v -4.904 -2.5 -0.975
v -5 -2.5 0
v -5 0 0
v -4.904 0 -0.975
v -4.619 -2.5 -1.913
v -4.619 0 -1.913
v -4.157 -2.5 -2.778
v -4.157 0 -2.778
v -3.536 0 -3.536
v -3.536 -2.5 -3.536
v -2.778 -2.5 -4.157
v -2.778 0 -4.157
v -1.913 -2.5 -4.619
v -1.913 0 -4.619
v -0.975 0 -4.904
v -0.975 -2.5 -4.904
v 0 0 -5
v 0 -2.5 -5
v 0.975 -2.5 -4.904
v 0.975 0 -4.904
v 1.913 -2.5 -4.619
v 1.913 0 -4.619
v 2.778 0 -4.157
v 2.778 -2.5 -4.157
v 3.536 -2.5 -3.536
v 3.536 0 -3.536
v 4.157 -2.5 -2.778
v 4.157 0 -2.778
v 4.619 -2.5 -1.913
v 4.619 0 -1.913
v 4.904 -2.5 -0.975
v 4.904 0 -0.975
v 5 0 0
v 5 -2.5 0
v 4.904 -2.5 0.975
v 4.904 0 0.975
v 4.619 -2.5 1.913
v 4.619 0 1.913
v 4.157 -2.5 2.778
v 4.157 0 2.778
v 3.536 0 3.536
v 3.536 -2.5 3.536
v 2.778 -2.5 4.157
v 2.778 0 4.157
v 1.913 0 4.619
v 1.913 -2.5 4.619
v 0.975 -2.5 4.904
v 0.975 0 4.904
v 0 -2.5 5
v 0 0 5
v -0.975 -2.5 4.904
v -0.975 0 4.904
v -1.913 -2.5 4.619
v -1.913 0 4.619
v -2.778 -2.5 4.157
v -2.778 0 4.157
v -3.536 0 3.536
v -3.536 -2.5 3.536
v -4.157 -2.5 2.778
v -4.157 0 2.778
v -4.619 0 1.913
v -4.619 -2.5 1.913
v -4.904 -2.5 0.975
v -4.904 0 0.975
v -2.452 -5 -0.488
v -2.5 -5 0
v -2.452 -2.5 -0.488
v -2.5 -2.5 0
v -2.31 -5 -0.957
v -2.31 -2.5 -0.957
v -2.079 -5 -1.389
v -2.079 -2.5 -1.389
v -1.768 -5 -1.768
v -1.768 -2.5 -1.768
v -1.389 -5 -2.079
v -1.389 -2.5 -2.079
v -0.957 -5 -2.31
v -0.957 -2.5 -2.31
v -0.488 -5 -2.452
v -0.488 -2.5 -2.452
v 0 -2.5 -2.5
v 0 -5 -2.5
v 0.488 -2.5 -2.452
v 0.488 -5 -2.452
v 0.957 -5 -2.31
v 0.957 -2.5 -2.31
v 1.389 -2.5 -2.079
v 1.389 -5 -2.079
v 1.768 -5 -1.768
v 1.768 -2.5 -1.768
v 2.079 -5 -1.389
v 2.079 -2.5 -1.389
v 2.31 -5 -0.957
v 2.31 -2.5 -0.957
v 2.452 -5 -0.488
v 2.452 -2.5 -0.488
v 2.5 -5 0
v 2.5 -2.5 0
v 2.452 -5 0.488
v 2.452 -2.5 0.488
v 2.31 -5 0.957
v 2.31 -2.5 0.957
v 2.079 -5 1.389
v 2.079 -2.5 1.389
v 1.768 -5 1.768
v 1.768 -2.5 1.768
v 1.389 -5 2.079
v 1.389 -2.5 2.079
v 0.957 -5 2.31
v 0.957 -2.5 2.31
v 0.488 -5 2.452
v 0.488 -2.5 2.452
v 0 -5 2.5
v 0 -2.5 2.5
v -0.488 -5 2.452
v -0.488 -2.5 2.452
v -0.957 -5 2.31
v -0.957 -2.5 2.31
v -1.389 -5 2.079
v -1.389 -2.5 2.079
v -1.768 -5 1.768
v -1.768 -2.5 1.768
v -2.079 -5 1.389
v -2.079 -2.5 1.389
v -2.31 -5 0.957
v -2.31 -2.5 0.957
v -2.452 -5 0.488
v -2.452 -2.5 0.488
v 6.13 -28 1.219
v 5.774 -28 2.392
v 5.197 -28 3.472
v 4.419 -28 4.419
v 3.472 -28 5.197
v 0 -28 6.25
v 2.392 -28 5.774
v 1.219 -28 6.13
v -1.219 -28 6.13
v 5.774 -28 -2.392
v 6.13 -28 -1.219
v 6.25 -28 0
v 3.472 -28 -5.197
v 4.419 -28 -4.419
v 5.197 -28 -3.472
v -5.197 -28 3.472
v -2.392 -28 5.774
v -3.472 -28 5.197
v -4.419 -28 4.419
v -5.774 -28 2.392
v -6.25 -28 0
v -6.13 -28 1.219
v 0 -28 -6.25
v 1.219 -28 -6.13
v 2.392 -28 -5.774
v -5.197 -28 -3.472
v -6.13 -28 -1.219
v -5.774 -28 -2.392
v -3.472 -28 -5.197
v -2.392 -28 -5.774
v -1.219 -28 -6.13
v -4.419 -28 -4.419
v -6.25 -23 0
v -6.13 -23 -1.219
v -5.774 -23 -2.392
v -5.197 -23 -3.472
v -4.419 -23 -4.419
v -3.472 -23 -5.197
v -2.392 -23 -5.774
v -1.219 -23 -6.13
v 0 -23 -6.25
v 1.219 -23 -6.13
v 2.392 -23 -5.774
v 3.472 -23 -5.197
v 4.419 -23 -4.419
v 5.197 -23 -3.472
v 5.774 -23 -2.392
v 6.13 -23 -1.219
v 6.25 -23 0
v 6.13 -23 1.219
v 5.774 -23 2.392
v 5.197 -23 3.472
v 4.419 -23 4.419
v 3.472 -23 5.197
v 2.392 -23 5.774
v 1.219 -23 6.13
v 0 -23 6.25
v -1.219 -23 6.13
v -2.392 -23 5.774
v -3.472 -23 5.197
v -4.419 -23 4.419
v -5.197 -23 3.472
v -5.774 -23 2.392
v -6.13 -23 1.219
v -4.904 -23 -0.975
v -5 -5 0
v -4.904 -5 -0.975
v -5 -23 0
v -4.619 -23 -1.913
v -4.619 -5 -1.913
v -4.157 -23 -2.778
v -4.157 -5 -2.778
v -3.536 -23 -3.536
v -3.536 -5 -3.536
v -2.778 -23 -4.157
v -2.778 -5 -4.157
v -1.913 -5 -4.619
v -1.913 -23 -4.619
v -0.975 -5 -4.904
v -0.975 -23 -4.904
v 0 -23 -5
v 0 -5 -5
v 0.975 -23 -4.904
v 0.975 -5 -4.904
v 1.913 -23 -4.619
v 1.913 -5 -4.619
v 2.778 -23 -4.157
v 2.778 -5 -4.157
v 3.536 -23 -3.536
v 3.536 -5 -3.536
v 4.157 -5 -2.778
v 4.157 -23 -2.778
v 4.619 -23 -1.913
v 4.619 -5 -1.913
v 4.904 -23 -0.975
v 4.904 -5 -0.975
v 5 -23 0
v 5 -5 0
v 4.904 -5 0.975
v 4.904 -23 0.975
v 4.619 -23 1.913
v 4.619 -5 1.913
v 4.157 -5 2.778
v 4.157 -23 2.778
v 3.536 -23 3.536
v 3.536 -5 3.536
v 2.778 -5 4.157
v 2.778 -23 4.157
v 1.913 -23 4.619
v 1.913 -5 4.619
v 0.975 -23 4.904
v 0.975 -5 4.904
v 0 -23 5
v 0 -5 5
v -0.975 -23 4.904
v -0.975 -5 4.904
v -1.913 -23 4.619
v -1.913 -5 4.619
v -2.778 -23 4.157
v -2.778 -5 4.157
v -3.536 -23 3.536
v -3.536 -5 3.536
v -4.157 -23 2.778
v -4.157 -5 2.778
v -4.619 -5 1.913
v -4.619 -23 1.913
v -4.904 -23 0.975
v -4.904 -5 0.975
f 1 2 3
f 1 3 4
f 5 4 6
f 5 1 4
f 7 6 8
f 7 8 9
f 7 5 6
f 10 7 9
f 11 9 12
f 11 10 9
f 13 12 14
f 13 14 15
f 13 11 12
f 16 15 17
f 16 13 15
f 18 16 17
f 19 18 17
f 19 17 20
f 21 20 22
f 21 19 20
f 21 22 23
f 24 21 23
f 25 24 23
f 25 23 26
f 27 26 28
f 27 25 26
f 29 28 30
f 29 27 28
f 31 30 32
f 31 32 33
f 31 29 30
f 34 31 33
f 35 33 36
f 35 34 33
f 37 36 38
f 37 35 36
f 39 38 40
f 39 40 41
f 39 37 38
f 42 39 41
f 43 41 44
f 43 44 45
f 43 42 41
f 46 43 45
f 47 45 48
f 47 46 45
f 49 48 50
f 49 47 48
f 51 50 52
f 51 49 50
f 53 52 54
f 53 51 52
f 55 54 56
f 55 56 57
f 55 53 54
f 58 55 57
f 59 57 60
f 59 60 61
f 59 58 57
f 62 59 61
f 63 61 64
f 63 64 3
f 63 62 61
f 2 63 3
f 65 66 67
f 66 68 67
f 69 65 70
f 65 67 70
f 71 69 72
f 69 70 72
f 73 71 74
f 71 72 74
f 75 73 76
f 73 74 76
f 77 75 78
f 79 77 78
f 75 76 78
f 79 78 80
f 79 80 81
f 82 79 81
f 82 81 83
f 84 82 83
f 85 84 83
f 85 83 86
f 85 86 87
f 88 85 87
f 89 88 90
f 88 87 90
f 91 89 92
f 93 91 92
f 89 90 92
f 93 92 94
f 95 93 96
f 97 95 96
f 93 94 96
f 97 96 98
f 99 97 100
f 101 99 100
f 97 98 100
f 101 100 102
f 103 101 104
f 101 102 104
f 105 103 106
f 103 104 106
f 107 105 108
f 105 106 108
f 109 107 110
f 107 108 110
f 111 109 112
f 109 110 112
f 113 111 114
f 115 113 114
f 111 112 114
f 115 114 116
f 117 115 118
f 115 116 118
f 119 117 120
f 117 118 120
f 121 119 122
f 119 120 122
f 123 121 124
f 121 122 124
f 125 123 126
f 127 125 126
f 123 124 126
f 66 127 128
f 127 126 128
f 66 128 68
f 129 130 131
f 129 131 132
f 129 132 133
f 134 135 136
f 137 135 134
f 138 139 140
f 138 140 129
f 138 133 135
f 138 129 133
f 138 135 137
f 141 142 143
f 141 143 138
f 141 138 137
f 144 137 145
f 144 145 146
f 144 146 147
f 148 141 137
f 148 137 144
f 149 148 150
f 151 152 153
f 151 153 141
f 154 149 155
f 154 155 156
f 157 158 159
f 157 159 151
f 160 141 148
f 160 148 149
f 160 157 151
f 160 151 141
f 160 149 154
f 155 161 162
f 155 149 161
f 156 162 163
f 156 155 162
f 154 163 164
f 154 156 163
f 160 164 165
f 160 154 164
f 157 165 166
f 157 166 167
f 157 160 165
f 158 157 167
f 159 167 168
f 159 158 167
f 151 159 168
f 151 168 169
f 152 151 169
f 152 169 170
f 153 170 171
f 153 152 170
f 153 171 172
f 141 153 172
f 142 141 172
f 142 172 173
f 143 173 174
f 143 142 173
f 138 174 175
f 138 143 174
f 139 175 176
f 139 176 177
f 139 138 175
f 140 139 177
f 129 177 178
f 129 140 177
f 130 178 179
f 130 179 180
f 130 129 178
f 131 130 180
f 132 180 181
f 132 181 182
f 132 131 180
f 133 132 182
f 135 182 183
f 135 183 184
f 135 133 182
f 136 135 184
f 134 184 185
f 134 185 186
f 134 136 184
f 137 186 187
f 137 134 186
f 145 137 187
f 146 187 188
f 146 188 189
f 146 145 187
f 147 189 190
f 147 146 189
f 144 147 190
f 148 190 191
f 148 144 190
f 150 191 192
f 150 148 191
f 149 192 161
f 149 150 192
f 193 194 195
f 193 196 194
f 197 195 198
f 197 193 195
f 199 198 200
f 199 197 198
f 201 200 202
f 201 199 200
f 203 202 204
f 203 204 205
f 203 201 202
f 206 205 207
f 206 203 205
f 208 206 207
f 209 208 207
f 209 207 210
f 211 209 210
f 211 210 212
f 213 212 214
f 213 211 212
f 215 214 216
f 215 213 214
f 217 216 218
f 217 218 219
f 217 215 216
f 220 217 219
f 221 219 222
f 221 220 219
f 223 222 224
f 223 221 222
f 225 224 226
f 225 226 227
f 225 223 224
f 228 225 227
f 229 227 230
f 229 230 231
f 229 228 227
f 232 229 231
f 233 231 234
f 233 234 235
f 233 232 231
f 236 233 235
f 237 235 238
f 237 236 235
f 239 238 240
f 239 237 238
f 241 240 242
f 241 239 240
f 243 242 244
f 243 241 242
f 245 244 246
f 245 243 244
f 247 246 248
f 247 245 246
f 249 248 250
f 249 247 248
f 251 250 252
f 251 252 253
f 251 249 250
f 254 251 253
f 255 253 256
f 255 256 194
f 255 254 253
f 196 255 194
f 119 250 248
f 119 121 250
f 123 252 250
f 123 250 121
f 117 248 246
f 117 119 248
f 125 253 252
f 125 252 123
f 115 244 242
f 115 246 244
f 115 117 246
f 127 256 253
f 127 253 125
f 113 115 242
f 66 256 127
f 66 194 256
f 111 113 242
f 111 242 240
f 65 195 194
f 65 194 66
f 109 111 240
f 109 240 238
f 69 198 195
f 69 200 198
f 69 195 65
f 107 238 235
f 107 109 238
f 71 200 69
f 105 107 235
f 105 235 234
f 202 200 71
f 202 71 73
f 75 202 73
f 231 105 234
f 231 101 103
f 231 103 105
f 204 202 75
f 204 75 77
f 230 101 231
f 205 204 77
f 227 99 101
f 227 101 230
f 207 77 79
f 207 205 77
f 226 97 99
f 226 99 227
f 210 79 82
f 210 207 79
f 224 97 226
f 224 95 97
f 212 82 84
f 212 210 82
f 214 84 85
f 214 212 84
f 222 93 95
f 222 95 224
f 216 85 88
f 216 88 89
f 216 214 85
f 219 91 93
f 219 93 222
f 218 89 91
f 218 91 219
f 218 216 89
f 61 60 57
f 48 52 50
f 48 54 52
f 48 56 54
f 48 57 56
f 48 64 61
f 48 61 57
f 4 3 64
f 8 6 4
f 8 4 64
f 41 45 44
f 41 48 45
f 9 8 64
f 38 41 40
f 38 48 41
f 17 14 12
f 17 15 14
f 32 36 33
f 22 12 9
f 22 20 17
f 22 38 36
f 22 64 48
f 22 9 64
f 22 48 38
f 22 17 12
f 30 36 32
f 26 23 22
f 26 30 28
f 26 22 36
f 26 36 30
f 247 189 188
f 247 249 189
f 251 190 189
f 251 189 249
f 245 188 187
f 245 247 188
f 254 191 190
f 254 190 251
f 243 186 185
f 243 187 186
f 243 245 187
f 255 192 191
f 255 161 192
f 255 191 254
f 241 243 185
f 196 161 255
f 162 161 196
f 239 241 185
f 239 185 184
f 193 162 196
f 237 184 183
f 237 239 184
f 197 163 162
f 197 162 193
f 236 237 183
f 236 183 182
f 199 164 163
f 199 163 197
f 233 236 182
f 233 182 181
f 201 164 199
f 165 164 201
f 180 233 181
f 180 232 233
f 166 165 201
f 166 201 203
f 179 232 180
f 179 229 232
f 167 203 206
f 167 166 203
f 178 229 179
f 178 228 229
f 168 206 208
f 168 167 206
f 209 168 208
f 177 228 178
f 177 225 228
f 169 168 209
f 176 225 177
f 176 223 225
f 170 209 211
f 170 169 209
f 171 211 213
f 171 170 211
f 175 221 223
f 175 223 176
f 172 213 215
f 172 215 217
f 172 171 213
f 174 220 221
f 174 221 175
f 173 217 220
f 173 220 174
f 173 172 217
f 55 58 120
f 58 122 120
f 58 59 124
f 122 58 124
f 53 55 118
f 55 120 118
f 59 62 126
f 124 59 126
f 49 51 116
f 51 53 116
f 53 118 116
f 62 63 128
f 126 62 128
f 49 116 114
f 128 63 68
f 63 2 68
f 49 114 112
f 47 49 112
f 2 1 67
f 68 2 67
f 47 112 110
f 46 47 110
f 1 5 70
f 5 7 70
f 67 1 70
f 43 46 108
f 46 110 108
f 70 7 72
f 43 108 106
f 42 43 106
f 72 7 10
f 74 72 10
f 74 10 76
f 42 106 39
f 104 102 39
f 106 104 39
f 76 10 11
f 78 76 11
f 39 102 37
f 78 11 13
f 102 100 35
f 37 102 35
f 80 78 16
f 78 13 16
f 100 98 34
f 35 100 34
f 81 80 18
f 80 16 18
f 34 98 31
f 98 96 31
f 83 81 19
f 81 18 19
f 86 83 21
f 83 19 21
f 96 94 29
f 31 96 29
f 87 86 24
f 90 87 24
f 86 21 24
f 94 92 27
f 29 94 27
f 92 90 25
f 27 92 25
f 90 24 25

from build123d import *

# Parameters (mm, degrees)
SKETCH2_W = 2.5
SKETCH2_H = 2.5


with BuildPart() as part:
    # Sketch1 → Revolve1 (revolve)
    with BuildSketch(Plane.XY, mode=Mode.PRIVATE) as revolve1_sk:
        Polygon((0, 0), (5, 0), (5, -23), (6.25, -23), (6.25, -28), (0, -28), align=None)
    revolve(revolve1_sk.sketch.rotate(Axis((0, 5, 0), (0, -1, 0)), 180), axis=Axis((0, 5, 0), (0, -1, 0)))

    # Sketch2 → Cut-Revolve1 (revolve, cut)
    with BuildSketch(Plane.XY, mode=Mode.PRIVATE) as cut_revolve1_sk:
        with Locations((3.75, -3.75)):
            Rectangle(SKETCH2_W, SKETCH2_H)
    revolve(cut_revolve1_sk.sketch.rotate(Axis((0, 0, 0), (0, -1, 0)), 180), axis=Axis((0, 0, 0), (0, -1, 0)), mode=Mode.SUBTRACT)


solid = part.part
